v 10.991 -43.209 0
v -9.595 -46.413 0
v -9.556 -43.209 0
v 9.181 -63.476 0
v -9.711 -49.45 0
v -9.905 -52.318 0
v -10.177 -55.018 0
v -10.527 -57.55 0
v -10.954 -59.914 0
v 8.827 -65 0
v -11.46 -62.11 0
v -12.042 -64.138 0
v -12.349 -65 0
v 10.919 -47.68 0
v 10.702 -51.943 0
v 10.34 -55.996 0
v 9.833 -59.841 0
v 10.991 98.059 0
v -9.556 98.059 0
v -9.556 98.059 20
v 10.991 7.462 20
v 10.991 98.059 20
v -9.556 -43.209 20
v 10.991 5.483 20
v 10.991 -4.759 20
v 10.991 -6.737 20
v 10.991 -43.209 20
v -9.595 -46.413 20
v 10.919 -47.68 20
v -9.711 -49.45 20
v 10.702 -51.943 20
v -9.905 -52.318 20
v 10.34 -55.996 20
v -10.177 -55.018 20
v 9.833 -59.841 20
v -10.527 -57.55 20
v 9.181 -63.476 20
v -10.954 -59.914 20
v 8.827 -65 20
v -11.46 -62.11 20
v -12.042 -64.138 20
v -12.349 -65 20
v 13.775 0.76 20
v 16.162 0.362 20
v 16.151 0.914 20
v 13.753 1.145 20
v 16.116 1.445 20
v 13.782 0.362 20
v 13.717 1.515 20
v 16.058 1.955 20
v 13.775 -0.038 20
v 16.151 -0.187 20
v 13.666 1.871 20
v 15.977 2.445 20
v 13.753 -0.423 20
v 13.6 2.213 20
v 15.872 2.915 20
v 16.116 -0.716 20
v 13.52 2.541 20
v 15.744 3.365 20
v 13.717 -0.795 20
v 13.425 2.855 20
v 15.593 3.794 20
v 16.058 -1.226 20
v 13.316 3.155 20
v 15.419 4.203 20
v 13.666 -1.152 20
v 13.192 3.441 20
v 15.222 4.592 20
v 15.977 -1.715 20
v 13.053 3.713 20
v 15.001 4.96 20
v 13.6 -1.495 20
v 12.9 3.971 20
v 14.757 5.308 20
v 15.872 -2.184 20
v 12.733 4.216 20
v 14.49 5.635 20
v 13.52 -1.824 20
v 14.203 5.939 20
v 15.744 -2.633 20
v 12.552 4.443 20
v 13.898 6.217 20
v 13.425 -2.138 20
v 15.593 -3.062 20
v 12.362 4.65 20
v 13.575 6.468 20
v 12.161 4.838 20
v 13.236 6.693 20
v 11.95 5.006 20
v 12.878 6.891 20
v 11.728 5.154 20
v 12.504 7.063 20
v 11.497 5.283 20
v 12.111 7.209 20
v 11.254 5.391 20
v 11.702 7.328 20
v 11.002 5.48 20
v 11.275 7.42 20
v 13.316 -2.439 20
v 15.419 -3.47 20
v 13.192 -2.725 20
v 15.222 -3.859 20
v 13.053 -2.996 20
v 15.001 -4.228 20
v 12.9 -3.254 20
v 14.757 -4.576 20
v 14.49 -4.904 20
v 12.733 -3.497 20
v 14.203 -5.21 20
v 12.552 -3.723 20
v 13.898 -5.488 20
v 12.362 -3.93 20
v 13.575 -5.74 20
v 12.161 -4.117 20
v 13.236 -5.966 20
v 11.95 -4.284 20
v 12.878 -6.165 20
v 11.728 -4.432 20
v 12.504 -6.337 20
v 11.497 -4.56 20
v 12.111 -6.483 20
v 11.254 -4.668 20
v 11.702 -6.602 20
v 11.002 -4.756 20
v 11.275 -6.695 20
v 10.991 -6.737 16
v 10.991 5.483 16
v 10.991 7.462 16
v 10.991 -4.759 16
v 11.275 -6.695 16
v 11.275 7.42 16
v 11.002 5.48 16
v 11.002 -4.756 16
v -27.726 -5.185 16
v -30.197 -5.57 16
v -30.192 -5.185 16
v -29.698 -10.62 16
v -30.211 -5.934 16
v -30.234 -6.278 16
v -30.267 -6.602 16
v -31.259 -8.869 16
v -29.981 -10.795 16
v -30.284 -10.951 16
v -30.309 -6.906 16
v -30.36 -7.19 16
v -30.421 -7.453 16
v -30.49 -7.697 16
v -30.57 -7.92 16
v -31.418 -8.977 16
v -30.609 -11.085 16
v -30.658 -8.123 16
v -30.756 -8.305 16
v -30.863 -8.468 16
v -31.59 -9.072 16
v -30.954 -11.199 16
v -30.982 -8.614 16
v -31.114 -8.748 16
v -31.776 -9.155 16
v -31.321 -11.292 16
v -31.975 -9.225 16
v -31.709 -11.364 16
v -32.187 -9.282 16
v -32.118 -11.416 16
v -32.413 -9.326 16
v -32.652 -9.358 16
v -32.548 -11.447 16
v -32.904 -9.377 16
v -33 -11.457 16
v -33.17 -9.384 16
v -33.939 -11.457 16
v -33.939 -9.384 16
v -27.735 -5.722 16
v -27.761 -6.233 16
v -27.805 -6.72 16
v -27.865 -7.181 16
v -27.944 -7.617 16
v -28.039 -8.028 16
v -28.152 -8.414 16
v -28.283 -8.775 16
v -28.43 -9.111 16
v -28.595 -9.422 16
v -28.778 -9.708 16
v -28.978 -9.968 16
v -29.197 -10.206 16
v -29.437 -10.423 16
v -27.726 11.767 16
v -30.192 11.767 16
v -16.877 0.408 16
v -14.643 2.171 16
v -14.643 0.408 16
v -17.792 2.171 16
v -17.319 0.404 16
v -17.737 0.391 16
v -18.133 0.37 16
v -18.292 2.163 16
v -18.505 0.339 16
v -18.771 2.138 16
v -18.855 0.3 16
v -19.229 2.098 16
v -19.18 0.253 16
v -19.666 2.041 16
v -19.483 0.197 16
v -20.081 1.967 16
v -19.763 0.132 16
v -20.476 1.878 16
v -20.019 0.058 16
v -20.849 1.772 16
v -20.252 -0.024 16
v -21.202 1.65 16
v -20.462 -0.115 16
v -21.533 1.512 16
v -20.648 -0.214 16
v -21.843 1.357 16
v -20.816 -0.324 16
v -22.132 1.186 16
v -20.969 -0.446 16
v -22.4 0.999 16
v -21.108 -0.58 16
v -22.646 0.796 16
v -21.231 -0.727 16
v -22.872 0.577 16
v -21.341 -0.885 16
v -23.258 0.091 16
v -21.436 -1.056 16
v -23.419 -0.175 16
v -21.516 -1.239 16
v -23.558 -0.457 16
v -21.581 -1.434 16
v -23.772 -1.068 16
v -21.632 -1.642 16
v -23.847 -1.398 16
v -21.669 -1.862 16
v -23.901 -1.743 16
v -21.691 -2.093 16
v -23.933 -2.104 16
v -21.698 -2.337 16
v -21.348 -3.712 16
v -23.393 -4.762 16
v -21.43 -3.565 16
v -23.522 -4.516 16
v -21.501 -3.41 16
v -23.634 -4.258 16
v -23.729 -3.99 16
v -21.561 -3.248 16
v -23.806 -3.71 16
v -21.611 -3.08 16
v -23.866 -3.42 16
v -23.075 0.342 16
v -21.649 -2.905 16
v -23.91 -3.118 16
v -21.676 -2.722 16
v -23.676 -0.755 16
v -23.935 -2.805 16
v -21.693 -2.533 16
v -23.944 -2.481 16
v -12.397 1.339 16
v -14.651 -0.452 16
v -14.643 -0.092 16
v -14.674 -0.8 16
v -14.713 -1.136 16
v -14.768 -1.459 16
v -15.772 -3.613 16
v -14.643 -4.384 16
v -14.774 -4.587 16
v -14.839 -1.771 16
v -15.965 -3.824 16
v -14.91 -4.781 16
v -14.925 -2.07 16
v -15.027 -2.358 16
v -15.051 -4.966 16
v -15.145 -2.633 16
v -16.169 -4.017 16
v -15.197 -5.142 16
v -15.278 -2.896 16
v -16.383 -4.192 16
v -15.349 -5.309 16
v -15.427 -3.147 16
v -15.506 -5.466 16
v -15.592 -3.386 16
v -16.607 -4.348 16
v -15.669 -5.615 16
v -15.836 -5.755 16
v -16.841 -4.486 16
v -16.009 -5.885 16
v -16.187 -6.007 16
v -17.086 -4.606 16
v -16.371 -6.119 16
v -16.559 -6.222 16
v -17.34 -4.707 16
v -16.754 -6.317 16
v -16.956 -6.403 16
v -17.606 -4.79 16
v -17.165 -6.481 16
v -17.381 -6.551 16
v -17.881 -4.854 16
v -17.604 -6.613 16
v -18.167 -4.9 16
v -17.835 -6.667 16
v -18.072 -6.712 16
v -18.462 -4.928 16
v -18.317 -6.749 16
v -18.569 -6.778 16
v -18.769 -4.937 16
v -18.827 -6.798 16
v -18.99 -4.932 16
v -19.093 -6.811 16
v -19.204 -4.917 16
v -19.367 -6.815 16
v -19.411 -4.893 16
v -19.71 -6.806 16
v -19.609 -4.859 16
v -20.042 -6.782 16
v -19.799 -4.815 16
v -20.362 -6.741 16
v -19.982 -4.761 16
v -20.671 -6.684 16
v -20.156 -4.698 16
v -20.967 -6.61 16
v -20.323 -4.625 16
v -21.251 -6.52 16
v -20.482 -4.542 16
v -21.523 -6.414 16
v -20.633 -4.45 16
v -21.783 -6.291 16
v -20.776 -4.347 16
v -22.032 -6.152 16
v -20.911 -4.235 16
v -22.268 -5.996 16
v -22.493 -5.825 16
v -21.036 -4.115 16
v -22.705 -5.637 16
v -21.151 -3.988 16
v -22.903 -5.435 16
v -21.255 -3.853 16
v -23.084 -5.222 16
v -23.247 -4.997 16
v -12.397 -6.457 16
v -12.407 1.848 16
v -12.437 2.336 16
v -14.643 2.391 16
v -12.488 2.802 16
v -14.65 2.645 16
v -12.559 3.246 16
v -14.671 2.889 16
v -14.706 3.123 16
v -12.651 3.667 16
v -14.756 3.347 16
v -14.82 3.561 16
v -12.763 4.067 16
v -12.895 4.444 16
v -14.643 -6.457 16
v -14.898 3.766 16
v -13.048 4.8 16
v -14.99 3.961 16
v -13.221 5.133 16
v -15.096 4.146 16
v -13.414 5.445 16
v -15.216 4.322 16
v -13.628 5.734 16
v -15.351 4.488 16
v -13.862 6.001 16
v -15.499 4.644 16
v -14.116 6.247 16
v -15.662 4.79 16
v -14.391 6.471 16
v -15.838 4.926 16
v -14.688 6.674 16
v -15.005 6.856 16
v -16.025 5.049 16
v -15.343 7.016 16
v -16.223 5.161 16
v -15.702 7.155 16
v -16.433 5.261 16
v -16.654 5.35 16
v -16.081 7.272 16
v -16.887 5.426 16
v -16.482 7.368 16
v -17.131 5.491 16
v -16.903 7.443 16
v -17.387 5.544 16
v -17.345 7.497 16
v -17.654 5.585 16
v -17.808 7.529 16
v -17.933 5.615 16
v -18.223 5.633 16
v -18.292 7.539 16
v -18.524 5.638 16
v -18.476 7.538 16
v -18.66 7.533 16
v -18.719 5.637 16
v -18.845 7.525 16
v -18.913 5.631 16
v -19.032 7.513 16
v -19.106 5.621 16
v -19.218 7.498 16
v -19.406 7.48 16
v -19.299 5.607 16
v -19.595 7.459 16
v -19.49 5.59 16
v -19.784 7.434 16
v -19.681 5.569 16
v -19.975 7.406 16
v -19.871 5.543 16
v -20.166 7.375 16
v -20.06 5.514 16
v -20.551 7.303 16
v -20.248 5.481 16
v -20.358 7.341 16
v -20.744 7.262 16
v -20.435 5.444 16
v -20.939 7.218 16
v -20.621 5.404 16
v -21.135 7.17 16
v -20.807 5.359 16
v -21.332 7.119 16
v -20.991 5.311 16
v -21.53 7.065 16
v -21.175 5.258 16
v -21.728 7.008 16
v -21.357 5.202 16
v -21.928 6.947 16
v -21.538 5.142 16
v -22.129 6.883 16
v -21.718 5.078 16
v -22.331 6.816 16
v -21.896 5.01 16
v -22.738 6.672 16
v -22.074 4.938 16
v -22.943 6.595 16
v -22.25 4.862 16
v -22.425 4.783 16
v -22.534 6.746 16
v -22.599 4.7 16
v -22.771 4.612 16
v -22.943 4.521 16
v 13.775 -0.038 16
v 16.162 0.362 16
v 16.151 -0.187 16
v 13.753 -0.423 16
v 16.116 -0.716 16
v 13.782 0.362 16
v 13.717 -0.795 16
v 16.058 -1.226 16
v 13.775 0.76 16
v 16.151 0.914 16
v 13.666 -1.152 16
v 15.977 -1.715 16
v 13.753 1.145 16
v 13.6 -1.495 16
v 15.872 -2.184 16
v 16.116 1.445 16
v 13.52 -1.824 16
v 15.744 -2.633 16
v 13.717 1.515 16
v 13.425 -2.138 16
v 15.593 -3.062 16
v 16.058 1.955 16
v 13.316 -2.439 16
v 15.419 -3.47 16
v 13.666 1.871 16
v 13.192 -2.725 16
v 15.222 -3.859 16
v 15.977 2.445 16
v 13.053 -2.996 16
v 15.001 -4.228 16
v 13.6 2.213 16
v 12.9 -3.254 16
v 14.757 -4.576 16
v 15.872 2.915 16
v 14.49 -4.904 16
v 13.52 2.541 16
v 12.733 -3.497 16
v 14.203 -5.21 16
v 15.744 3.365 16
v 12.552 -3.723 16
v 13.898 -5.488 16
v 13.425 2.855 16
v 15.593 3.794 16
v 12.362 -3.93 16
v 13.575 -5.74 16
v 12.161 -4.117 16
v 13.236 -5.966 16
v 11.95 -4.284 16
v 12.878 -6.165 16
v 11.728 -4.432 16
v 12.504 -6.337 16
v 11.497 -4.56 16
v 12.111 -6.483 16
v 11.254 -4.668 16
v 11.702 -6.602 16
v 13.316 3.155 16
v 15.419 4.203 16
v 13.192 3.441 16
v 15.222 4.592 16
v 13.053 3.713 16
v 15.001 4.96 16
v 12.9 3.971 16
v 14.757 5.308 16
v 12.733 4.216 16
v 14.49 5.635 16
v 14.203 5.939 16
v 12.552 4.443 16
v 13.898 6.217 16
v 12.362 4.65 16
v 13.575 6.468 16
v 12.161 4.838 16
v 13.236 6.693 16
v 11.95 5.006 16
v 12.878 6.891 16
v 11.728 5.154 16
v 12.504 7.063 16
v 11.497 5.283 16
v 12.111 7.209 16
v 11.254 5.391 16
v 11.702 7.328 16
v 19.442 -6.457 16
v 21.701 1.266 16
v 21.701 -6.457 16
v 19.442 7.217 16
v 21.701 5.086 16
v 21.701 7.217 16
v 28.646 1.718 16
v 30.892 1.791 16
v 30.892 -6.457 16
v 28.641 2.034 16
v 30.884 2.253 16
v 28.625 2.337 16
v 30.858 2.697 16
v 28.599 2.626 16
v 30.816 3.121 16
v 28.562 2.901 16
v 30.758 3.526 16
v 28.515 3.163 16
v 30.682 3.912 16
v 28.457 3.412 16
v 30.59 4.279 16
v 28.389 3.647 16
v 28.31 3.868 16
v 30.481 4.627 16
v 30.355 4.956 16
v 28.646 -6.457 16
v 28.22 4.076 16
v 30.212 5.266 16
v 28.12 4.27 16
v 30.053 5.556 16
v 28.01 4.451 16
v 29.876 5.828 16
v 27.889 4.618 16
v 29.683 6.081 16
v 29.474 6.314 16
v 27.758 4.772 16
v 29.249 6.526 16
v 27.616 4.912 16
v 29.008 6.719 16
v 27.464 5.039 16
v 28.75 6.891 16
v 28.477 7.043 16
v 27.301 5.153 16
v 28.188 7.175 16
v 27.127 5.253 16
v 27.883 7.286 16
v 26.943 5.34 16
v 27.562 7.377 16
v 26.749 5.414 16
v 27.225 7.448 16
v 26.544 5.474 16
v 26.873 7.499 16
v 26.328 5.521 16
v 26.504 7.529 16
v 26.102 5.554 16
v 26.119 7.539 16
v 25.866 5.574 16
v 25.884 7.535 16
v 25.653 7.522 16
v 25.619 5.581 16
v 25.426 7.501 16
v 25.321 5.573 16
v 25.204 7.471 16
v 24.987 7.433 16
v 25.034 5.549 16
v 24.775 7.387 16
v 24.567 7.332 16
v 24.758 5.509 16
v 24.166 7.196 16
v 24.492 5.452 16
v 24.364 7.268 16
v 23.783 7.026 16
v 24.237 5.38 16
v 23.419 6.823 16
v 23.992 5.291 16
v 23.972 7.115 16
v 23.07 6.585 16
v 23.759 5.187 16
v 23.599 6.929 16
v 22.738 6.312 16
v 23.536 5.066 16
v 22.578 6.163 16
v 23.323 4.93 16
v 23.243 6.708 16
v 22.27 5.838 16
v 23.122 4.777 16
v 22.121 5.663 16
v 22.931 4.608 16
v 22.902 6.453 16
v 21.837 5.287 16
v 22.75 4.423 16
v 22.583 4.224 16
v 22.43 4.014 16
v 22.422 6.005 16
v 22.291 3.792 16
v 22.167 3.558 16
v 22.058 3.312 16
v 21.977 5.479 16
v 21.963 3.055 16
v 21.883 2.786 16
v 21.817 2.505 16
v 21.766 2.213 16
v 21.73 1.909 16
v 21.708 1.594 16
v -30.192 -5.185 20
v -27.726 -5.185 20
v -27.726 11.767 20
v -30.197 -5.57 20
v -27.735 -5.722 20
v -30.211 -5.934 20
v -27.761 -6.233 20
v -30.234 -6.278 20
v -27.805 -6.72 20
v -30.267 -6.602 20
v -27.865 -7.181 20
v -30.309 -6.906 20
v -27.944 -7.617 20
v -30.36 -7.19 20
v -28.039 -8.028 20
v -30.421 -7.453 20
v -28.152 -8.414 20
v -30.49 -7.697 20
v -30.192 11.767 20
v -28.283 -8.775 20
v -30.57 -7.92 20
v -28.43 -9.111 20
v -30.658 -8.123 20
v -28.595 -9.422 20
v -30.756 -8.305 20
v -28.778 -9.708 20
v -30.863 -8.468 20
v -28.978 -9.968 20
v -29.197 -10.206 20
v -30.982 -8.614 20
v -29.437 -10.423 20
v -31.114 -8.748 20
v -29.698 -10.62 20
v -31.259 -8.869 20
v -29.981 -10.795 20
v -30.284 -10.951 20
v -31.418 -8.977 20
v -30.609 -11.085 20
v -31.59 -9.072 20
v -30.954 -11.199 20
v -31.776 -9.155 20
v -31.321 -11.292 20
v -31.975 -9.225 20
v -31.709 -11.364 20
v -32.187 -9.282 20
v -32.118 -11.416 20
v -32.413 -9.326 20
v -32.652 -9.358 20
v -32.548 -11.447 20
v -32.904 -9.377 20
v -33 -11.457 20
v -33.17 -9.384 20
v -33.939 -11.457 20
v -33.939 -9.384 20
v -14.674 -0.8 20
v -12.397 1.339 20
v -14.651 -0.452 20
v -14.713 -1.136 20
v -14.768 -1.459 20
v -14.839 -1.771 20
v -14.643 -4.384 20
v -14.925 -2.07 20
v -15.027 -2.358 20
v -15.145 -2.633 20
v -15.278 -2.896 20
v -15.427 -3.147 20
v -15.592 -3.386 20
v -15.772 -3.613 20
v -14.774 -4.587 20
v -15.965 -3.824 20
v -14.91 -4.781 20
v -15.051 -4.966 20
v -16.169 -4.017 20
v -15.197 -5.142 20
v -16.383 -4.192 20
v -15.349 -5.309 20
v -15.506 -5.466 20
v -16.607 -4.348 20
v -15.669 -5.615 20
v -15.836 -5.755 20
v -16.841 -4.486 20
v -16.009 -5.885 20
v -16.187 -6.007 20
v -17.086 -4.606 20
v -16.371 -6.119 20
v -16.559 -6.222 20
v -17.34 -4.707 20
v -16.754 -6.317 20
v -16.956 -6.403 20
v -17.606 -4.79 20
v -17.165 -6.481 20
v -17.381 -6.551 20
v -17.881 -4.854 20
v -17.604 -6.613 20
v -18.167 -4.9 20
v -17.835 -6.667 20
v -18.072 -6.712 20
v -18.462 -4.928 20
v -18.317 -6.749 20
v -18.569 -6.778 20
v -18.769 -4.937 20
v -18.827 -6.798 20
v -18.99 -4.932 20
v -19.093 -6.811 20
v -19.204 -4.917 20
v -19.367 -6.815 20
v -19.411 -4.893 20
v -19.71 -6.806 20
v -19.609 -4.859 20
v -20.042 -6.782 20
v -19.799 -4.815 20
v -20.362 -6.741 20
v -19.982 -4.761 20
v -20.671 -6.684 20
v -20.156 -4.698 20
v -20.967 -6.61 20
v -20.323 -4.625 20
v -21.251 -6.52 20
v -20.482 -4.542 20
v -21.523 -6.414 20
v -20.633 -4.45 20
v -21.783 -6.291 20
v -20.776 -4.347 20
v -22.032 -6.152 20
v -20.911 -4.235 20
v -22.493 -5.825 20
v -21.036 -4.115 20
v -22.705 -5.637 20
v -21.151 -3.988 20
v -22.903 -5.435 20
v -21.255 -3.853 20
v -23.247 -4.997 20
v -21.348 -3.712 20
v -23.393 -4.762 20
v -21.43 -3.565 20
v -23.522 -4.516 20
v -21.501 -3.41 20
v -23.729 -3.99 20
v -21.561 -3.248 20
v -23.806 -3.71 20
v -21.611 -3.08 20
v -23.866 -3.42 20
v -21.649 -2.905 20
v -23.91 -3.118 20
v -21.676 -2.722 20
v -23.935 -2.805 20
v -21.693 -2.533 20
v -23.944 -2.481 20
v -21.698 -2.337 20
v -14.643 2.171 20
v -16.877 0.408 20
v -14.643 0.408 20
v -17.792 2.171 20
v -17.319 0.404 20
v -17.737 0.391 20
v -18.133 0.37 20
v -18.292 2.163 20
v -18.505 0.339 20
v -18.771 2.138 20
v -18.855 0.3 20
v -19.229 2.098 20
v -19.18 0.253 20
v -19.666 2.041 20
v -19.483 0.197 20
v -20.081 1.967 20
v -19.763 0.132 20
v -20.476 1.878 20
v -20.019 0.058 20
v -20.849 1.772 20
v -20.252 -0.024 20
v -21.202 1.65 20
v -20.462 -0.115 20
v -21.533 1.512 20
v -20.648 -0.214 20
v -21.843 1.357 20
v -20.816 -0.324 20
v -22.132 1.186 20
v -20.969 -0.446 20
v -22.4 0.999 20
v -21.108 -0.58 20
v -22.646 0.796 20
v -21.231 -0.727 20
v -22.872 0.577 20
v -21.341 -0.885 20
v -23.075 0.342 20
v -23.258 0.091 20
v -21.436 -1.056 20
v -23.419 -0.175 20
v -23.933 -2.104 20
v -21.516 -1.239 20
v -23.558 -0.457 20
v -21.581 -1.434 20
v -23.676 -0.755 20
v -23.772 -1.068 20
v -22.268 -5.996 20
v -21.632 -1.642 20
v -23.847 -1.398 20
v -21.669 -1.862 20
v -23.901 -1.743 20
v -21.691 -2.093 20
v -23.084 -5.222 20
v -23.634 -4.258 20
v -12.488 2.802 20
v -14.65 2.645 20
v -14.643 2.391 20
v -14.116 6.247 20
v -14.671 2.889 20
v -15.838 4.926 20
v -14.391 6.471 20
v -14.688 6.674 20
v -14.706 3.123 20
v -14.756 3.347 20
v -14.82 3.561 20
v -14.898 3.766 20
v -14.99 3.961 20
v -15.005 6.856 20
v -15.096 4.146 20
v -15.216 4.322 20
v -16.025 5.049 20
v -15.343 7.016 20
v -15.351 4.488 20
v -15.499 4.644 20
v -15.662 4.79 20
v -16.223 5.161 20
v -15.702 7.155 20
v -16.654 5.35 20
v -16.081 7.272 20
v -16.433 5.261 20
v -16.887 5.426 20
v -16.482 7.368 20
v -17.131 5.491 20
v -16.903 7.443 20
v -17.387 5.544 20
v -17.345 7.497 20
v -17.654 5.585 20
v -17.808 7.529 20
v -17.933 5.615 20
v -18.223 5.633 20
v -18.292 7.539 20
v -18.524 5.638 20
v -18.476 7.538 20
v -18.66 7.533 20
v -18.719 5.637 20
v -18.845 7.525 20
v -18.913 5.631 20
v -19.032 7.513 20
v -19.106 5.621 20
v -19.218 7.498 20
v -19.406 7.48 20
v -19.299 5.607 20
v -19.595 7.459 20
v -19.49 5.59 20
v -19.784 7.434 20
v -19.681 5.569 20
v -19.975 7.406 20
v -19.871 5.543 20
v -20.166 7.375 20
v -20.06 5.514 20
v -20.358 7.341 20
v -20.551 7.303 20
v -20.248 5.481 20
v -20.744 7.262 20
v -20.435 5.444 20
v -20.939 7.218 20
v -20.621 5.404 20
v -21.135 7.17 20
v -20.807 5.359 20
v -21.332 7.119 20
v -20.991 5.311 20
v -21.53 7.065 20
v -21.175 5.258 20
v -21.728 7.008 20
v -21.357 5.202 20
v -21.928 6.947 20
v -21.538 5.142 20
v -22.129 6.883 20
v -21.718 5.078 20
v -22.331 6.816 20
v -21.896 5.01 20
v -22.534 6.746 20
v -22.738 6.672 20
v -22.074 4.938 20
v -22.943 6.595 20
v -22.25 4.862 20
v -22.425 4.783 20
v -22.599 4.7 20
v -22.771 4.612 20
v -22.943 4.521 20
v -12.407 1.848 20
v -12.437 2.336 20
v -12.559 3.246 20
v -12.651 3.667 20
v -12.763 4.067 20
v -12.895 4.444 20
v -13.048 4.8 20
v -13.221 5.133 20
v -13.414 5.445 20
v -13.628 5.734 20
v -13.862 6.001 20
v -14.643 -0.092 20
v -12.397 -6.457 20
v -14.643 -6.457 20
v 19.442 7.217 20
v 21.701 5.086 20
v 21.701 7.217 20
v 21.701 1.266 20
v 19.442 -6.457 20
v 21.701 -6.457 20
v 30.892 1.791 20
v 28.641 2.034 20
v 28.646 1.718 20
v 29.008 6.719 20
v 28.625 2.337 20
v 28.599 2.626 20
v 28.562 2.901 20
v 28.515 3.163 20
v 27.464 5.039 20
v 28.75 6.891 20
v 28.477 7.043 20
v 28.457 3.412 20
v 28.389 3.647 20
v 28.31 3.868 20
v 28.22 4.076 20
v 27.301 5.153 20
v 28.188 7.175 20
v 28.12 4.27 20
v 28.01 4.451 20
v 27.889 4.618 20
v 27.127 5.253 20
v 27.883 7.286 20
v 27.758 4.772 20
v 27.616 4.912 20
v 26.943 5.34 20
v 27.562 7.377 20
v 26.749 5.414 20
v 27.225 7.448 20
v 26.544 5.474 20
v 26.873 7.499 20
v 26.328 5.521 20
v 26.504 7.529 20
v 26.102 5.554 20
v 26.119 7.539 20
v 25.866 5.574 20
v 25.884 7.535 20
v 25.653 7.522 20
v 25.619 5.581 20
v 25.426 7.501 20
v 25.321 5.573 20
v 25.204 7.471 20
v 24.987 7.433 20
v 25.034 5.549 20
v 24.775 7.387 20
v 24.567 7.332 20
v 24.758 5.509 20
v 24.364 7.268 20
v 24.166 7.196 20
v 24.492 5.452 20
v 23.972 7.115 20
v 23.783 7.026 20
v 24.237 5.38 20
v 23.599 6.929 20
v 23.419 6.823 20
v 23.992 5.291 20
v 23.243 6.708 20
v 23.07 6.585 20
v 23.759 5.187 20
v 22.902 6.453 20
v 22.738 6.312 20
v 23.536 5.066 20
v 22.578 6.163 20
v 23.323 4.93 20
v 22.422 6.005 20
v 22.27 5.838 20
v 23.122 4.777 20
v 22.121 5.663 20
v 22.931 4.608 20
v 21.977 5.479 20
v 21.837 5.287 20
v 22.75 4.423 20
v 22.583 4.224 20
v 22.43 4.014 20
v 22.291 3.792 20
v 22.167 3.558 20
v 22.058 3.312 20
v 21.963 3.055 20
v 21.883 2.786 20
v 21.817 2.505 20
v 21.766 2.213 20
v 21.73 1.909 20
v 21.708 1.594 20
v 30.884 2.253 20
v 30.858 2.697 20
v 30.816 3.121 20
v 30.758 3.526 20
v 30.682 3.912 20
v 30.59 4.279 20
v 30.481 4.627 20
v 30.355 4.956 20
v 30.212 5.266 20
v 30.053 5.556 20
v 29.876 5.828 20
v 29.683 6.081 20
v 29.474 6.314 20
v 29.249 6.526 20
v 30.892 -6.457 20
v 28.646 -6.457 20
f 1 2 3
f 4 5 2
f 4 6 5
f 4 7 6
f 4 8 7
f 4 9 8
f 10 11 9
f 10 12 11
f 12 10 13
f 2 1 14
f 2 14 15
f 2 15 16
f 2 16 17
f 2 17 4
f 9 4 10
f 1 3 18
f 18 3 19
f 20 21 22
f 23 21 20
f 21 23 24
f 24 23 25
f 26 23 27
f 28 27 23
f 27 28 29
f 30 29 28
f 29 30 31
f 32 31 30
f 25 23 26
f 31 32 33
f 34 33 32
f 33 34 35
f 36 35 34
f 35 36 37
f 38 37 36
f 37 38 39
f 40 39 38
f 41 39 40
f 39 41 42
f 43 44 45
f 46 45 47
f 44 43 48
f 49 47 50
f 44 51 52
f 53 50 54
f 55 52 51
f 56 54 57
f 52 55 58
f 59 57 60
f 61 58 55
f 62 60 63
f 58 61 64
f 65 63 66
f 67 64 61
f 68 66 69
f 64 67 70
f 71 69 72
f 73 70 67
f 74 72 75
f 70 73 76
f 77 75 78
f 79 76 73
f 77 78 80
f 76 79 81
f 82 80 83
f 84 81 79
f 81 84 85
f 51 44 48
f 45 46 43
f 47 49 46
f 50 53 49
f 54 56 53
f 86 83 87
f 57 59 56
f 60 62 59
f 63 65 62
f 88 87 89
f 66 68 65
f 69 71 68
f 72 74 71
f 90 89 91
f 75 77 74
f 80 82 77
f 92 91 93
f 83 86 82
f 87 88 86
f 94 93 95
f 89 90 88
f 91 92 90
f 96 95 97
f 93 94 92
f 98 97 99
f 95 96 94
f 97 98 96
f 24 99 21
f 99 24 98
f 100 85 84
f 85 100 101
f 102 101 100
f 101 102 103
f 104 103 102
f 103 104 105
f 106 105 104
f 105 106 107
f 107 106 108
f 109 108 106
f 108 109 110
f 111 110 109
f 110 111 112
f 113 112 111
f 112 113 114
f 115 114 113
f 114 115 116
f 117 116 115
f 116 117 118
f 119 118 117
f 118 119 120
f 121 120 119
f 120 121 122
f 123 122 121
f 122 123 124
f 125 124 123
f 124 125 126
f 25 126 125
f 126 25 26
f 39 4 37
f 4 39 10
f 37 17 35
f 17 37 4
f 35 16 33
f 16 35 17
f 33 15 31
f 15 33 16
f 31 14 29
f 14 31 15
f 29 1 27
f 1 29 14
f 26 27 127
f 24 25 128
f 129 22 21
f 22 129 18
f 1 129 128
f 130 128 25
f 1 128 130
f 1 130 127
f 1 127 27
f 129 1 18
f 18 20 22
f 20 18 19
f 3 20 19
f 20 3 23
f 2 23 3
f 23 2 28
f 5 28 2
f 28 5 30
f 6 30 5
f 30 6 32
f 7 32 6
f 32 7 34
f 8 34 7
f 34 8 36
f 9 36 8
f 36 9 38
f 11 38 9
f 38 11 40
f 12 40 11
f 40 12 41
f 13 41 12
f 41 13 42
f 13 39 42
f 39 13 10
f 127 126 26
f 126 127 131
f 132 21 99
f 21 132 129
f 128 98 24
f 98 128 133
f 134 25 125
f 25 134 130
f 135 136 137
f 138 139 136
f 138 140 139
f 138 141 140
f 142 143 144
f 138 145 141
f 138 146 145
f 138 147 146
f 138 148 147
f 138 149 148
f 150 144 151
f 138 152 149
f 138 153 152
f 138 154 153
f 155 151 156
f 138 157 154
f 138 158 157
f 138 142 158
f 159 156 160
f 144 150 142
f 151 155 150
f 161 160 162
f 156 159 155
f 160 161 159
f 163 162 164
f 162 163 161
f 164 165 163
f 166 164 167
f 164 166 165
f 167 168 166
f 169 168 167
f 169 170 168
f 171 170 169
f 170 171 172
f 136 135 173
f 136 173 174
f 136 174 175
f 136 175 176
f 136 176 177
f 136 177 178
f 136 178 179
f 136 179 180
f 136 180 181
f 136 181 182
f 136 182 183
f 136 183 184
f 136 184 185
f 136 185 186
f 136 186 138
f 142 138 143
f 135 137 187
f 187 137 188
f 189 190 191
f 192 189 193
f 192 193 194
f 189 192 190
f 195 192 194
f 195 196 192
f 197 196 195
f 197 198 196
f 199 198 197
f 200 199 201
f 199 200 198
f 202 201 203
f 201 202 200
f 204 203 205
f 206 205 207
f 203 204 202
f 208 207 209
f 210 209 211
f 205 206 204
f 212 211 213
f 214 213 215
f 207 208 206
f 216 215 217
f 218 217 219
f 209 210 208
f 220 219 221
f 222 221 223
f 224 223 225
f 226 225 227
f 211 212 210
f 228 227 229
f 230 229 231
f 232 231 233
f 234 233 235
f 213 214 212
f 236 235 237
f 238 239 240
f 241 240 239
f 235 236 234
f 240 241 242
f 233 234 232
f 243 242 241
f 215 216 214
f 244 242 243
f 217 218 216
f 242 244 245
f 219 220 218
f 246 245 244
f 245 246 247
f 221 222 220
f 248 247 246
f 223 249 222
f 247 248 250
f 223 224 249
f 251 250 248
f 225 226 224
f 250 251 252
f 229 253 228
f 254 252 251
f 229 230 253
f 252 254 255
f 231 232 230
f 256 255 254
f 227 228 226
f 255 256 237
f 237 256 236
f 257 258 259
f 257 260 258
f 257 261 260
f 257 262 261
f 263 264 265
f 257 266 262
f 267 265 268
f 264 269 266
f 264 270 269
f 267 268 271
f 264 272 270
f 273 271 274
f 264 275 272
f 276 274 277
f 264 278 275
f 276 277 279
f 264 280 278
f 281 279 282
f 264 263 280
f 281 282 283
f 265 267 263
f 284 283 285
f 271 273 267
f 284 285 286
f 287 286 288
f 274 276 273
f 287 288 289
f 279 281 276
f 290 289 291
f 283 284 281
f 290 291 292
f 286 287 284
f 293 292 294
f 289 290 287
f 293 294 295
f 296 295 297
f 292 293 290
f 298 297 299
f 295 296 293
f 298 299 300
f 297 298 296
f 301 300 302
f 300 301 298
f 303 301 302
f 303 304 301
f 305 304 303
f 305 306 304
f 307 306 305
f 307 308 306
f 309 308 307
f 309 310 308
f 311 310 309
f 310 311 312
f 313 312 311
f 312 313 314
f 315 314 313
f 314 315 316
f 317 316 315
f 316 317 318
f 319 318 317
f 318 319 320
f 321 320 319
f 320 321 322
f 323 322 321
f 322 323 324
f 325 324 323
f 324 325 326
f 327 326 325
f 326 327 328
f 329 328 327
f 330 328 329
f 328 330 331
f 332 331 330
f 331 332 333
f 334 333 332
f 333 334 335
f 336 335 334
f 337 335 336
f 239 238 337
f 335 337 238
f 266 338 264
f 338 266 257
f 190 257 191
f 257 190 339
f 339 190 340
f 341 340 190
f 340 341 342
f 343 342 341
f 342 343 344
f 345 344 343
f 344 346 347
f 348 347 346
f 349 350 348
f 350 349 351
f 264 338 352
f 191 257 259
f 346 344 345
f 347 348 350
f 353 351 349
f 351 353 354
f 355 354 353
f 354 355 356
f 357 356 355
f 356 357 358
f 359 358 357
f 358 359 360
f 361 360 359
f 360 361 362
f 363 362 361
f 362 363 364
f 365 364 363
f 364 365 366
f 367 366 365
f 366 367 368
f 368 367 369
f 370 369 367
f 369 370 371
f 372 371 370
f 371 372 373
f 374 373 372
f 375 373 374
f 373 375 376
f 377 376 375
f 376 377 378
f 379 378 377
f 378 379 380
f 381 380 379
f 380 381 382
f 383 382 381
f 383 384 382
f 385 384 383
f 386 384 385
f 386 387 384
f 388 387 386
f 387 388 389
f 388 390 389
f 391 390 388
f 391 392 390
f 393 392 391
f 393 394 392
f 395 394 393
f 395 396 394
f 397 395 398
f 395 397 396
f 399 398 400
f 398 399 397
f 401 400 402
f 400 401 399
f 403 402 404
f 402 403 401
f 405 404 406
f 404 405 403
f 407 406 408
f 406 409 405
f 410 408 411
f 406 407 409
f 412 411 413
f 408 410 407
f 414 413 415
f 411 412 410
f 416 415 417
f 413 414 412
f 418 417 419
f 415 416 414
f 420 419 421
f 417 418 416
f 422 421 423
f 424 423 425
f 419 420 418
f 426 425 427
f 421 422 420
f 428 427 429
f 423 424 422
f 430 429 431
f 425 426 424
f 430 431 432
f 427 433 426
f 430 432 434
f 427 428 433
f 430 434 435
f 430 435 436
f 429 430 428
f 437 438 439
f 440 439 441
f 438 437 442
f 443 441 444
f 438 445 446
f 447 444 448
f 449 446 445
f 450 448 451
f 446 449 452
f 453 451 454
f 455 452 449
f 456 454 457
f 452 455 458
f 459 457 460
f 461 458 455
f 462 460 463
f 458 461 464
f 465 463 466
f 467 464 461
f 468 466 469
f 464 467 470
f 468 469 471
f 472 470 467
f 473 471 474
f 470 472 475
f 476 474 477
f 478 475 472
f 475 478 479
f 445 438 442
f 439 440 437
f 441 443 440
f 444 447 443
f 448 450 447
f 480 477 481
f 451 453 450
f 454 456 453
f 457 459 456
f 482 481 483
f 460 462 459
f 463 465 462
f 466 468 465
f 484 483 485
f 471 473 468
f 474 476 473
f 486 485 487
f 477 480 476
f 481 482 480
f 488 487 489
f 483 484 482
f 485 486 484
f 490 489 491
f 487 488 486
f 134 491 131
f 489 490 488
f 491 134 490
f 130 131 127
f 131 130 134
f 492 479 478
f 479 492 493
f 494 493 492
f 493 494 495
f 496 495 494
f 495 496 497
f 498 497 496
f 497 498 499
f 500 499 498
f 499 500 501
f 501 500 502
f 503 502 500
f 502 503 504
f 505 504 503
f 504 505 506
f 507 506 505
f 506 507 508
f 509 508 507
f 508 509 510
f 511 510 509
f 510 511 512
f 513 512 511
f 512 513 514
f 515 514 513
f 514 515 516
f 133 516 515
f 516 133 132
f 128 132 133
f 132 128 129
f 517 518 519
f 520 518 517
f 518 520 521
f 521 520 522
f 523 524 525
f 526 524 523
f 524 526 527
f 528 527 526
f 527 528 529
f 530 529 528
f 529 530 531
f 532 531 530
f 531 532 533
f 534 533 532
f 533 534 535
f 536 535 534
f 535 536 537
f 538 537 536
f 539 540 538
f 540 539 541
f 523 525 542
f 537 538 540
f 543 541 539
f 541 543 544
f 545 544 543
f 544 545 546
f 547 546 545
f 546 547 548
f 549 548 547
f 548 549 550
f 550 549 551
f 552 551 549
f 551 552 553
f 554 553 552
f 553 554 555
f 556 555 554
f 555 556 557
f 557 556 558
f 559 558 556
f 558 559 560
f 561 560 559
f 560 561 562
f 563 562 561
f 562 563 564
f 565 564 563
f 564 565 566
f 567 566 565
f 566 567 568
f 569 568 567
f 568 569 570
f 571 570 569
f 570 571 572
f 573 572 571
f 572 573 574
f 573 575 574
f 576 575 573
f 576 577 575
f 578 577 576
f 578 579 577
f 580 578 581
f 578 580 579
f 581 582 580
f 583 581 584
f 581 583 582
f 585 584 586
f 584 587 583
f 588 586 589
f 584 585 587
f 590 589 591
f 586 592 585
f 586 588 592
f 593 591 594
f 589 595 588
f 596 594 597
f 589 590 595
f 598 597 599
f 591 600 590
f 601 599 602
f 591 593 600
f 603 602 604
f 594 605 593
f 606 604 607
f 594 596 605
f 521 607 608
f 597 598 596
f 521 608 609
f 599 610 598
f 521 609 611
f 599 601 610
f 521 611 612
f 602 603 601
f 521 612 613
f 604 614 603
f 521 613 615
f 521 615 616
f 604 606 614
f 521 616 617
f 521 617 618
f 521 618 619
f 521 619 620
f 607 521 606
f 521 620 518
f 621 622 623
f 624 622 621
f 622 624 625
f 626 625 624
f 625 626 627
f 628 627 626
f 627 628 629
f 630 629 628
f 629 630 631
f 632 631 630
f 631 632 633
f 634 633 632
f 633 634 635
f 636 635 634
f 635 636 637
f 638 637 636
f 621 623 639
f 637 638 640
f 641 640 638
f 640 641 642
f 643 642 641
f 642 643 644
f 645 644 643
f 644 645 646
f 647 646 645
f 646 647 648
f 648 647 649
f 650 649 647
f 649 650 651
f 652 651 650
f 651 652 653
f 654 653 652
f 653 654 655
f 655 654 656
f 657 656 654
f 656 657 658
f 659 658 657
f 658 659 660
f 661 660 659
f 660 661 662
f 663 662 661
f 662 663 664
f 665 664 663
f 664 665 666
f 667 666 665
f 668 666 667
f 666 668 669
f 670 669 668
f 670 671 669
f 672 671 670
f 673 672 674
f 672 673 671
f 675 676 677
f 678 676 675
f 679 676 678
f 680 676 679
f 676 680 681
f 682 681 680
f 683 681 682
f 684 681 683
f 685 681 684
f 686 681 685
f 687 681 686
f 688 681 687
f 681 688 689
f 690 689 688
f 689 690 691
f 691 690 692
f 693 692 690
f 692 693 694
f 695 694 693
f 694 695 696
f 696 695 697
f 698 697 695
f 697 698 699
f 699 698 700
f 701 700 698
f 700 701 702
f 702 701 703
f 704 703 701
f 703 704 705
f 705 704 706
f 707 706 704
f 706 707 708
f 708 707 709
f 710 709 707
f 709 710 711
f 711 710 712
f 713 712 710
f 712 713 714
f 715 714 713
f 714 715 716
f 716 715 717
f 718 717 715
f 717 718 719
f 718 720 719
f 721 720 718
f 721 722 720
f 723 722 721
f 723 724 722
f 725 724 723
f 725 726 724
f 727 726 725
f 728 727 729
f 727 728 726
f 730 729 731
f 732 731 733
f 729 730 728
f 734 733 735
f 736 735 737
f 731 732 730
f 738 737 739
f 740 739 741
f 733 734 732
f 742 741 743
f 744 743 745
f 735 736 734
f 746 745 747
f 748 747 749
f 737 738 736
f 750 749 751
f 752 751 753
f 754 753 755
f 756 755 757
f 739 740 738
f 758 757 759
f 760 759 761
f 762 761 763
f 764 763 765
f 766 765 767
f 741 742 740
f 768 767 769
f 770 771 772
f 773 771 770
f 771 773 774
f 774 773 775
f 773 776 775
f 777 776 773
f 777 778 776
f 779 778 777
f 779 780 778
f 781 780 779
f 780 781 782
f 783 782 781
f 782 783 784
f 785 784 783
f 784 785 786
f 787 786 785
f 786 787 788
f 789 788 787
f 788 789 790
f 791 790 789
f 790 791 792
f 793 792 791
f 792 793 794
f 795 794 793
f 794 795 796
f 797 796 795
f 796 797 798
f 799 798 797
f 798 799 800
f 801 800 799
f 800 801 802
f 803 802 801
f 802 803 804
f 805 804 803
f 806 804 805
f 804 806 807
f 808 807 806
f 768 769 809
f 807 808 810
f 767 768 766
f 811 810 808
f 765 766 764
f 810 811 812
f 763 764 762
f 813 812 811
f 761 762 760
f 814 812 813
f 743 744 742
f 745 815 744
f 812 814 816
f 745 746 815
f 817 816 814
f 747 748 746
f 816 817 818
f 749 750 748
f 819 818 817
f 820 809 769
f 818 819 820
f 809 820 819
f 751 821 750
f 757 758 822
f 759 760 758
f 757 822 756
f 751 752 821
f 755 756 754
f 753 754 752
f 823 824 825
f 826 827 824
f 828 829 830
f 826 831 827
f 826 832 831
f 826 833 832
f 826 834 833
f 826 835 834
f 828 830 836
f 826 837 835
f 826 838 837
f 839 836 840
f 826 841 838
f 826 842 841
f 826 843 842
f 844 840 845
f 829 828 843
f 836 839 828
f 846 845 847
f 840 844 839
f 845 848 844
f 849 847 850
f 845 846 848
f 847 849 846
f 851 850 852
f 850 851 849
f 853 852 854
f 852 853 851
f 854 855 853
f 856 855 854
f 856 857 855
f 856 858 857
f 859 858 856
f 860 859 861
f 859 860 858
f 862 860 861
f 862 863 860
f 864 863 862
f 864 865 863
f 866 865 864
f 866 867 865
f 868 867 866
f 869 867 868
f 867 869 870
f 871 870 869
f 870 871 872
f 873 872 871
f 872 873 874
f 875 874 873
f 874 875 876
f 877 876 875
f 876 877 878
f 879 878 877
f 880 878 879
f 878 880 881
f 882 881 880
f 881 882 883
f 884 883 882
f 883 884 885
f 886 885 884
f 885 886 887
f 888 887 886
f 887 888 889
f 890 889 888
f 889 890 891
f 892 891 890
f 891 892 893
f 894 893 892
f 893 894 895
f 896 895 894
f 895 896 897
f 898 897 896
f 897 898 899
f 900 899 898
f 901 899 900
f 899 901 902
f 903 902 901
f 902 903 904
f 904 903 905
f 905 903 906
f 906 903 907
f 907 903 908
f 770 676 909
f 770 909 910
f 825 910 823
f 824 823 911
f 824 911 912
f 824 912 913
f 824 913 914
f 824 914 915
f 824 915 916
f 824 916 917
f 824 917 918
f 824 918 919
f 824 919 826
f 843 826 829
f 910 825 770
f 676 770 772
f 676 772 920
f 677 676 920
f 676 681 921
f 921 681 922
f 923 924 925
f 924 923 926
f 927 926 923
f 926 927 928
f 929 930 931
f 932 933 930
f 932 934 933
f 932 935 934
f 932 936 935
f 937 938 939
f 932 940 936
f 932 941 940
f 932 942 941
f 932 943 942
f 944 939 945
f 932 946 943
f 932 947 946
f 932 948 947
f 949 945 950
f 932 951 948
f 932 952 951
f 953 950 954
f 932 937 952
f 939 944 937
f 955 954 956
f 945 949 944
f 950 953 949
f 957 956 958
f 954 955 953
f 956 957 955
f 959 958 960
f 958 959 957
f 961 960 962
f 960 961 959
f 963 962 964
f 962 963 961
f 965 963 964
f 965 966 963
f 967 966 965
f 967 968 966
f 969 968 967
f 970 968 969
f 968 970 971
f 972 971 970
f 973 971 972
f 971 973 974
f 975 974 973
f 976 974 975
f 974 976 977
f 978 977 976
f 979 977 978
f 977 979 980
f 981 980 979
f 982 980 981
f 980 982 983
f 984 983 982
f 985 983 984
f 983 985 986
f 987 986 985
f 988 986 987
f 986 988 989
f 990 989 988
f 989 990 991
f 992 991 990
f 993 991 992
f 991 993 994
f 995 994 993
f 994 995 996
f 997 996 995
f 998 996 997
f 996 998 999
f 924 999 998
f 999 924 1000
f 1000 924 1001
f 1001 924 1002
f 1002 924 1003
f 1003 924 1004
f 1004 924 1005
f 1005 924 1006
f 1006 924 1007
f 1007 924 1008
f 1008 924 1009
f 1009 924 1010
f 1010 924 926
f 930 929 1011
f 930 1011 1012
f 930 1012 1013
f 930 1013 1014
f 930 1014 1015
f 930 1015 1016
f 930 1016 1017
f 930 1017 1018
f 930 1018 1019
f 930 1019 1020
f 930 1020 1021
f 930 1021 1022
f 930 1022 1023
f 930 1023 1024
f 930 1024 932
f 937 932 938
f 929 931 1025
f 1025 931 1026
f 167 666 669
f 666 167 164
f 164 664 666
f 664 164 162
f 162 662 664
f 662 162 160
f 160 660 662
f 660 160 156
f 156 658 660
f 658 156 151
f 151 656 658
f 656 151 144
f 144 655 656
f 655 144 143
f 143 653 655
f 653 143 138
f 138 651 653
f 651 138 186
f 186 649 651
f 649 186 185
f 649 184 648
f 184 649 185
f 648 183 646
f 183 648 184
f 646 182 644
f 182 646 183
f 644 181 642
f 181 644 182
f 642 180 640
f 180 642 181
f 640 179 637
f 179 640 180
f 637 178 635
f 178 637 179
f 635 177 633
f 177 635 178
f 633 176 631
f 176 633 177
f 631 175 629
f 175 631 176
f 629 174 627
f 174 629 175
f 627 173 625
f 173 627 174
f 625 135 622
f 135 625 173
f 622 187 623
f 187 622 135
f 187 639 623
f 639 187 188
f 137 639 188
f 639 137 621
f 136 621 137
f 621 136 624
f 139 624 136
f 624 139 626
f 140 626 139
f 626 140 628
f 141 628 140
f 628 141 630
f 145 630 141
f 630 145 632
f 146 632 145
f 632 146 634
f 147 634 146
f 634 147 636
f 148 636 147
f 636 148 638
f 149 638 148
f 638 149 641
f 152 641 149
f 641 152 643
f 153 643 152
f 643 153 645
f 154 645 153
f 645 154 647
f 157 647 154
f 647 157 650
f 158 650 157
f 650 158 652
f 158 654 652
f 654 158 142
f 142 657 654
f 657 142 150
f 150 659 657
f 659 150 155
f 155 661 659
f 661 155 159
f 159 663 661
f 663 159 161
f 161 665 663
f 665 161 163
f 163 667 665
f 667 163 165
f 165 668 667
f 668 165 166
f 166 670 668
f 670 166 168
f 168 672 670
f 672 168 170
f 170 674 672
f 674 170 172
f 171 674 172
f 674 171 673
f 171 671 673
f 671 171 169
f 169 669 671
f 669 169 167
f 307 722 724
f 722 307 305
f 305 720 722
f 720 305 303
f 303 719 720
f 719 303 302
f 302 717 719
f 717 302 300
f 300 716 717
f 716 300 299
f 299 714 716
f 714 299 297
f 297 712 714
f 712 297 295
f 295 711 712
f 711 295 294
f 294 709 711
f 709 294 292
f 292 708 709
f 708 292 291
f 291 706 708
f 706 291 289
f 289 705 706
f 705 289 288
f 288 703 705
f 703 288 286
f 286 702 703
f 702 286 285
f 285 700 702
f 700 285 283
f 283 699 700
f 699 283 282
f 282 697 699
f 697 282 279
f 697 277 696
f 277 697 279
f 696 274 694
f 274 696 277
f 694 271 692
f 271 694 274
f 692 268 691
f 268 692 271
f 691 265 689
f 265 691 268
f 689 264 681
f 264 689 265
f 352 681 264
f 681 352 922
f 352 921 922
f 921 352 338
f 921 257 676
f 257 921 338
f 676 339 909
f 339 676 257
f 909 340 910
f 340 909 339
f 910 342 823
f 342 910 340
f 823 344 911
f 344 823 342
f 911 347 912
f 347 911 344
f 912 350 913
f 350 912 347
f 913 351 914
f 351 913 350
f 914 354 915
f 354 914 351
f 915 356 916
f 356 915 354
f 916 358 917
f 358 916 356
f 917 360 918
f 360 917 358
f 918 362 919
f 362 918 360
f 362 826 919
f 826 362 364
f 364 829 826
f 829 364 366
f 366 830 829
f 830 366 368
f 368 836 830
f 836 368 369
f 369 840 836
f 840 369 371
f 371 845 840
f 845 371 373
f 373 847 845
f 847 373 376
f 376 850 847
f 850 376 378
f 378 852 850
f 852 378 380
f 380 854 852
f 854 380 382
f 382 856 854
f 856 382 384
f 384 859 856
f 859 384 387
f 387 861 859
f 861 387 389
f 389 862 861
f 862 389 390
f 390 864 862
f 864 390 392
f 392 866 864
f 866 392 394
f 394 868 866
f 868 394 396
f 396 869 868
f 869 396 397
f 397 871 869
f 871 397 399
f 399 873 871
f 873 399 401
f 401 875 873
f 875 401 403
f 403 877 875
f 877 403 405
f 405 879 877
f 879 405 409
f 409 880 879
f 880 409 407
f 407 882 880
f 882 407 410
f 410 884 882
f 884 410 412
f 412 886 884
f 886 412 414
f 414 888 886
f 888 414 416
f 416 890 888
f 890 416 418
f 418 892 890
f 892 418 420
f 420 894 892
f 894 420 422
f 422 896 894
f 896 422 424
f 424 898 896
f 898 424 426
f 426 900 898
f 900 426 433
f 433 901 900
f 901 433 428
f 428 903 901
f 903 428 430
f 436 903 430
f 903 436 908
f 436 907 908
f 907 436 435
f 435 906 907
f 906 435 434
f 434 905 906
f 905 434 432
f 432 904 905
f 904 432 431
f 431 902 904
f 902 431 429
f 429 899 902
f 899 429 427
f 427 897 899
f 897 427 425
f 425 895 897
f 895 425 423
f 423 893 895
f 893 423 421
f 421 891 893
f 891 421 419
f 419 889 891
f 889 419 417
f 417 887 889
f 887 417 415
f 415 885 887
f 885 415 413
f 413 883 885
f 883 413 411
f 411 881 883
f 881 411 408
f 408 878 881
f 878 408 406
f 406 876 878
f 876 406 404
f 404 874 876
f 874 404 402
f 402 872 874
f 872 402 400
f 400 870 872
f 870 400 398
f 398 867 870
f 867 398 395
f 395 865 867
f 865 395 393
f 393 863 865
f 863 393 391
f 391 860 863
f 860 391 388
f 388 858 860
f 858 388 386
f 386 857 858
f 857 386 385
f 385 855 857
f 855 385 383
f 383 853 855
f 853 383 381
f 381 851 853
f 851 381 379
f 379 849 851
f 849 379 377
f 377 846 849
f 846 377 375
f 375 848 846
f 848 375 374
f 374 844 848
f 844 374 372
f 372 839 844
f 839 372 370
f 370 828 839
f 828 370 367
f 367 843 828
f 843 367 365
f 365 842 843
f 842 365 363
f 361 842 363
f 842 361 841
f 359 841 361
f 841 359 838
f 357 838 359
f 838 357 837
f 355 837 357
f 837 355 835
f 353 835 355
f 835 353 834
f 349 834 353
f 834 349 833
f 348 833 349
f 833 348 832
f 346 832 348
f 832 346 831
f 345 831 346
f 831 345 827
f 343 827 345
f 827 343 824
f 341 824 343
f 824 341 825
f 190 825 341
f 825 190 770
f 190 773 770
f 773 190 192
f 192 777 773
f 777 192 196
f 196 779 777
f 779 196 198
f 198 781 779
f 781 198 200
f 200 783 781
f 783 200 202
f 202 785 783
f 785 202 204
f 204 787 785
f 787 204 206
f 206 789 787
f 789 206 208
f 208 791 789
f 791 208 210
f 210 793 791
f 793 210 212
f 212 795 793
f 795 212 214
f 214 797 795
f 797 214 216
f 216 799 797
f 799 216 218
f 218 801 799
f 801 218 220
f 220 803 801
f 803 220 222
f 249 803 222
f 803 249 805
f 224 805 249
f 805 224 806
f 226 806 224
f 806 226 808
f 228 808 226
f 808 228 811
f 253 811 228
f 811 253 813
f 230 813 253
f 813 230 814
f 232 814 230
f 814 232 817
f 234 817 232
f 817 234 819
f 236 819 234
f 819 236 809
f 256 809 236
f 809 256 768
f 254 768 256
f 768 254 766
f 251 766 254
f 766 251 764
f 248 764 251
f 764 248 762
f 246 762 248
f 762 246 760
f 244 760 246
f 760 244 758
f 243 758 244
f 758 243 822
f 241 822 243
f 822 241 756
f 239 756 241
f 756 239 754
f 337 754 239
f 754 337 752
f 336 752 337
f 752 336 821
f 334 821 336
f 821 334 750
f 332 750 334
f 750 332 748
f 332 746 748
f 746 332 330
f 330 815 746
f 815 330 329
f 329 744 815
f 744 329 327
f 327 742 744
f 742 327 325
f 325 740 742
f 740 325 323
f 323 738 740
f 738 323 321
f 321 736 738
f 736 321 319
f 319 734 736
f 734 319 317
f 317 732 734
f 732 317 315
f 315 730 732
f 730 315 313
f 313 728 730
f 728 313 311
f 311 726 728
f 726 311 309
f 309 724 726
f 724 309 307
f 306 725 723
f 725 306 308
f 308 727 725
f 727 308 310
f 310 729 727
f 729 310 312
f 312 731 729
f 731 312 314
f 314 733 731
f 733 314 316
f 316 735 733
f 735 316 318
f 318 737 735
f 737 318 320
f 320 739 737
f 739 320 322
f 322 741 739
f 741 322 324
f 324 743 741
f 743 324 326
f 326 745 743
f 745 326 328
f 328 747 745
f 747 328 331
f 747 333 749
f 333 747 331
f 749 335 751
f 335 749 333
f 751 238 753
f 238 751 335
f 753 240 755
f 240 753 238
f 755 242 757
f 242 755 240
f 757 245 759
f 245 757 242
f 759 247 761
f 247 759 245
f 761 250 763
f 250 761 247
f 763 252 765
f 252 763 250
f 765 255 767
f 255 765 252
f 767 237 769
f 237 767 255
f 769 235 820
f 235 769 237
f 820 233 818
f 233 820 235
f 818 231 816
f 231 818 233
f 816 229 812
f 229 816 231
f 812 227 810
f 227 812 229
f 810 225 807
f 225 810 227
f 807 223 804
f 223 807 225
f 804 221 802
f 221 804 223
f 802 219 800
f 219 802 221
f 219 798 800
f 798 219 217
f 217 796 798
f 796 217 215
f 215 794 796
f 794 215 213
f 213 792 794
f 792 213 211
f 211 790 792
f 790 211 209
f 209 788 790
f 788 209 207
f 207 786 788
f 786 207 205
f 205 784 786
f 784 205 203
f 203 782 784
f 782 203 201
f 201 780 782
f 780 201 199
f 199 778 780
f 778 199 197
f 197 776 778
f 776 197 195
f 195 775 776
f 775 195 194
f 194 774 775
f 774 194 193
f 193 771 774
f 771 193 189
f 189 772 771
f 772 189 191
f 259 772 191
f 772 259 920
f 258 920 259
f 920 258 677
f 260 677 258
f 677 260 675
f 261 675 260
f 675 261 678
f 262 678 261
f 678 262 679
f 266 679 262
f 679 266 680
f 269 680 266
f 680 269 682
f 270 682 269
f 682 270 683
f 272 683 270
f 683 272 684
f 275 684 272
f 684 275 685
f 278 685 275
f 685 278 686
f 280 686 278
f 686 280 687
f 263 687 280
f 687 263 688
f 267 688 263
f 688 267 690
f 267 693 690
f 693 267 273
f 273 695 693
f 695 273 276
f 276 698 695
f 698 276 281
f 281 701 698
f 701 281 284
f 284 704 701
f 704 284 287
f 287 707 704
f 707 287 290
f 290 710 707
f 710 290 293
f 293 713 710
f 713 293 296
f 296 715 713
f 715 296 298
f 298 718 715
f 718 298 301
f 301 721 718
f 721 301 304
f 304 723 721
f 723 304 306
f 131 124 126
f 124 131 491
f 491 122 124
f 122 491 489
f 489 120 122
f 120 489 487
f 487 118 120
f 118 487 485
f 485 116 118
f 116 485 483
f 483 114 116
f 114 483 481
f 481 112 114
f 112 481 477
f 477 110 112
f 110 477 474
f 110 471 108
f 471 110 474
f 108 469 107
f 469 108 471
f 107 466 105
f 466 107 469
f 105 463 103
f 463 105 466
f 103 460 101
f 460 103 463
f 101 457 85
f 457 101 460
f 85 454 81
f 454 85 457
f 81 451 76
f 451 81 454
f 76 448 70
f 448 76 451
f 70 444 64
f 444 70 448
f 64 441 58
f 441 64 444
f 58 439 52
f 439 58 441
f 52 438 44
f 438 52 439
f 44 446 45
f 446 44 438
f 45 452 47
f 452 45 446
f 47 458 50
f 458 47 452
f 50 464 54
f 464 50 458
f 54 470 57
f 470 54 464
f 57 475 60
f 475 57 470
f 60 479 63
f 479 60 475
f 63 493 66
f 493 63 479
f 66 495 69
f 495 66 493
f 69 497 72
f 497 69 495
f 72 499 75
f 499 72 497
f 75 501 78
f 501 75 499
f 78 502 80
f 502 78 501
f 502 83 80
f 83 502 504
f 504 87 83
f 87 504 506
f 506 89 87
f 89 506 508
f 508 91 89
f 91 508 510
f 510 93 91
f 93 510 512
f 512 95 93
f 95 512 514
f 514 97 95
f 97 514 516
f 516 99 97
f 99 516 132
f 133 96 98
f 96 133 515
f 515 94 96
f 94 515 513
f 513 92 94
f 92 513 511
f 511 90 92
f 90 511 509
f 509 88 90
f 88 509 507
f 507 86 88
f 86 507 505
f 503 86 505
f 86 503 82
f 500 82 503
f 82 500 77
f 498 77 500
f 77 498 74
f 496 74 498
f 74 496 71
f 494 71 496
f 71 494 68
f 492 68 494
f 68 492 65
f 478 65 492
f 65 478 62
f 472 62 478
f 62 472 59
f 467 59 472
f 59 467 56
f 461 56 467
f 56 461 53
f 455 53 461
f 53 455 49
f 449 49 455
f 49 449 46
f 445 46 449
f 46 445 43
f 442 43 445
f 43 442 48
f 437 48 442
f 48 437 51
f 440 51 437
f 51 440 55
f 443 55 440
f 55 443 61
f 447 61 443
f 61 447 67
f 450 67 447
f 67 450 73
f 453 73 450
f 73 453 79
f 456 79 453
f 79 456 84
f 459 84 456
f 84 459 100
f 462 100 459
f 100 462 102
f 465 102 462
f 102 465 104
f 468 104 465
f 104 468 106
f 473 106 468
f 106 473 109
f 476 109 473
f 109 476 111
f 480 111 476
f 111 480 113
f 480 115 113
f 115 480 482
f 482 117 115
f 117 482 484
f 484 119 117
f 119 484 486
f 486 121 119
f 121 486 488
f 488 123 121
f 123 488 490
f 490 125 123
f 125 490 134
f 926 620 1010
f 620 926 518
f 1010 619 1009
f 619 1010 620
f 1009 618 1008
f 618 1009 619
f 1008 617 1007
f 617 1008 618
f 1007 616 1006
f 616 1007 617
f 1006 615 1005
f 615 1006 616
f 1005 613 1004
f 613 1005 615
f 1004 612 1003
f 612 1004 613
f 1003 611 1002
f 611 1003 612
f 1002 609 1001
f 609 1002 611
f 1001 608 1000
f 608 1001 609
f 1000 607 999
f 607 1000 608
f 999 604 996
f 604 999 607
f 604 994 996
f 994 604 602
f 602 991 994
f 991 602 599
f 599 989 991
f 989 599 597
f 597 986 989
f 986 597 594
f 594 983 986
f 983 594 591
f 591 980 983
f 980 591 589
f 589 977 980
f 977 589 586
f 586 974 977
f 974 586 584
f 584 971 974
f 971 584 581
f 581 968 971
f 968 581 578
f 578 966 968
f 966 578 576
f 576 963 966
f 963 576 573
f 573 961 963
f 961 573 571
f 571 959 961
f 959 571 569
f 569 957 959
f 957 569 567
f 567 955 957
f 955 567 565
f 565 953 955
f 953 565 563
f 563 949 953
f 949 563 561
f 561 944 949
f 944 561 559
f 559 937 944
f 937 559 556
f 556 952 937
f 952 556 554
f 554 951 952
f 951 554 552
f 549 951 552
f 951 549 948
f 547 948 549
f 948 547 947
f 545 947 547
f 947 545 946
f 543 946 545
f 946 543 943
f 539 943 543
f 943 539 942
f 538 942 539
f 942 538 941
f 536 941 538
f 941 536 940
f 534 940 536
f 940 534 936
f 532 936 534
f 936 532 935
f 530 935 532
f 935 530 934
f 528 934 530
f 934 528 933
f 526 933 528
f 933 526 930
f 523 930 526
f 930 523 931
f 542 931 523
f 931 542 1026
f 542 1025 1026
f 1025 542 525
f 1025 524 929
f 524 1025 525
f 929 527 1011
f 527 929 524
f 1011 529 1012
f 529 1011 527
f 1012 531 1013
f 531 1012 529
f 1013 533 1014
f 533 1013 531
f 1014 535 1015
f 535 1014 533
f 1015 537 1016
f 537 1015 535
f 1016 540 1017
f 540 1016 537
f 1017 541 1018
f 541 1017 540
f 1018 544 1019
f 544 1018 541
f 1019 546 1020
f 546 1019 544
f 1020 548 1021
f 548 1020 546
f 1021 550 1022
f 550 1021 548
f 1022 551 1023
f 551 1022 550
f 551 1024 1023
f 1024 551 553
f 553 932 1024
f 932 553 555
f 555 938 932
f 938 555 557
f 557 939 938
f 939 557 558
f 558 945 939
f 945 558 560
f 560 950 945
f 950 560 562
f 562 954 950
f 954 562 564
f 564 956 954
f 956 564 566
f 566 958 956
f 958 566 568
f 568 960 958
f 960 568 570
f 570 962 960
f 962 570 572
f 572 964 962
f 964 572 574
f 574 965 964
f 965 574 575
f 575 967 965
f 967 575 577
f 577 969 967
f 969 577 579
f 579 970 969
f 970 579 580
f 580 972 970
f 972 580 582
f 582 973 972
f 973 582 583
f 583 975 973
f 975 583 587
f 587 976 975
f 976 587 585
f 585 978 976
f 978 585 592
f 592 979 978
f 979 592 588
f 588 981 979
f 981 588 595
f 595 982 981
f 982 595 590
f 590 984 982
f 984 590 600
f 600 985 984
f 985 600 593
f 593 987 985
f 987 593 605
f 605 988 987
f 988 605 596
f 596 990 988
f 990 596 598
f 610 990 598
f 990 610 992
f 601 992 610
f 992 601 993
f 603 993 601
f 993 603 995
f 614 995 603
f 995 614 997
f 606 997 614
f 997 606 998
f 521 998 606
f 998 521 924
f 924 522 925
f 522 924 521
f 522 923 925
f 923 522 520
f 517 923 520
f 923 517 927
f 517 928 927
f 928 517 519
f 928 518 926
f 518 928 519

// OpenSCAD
// ============================================================================
// nome_parametrico.scad — NameForge
// ============================================================================

// ── Texte ────────────────────────────────────────────────────────────────────
nome                 = "Jason";
font_base            = "Bebas Neue:style=Regular";
font_corsivo         = "Pacifico:style=Regular";
mostra_base          = 1;
mostra_nome          = 1;

// ── Dimensions (mm) ──────────────────────────────────────────────────────────
altezza_base         = 20;
profondita_incisione = 4;   // 0 = nom affleurant, N = N mm de profondeur
dimensione_lettera   = 150;
dimensione_nome      = 18;
altezza_nome_solido  = 7;   // hauteur totale du bloc nom (incrusté + dépassement)
offset_nome_x        = 0;
offset_nome_y        = 0;
tolleranza           = 0.1;
margine_taglio       = 10;

// nome_preview_z : Z de départ du nom
// preview  : altezza_base - profondita_incisione → nom dans le creux
// export   : 0 → chemin base_avec_nom_export
nome_preview_z       = 0;

// incidi_preview : 1 = générer base avec creux visible
incidi_preview       = 0;

// taglio_base : mm à retirer depuis le bas du bounding box de la lettre
// 0 = pas de coupe (courbe conservée), 30 = coupe haute (lettre très plate)
taglio_base          = 10;

// ── Couleurs ─────────────────────────────────────────────────────────────────
colore_base          = [0.914, 0.580, 0.965];
colore_nome          = [1.000, 1.000, 1.000];

// chanfrein_haut_mm : bord supérieur chanfreiné (biseauté à 45°)
// 0 = désactivé ; ex. 1.5 = chanfrein de 1.5 mm
chanfrein_haut_mm    = 0;

// ── Qualité ──────────────────────────────────────────────────────────────────
$fa = 4;
$fs = 0.4;

// ── Assertions de sécurité ───────────────────────────────────────────────────
assert(len(nome) > 0,
  "Le texte ne peut pas être vide");
assert(profondita_incisione < altezza_base,
  "profondita_incisione doit être < altezza_base");
assert(chanfrein_haut_mm == 0 || chanfrein_haut_mm < altezza_base,
  "chanfrein_haut_mm doit être < altezza_base");
assert(chanfrein_haut_mm == 0 || chanfrein_haut_mm < dimensione_lettera / 2,
  "chanfrein_haut_mm trop grand par rapport à la taille de la lettre");
assert(taglio_base >= 0 && taglio_base < dimensione_lettera * 0.5,
  "taglio_base doit être dans [0, dimensione_lettera/2[");

// ============================================================================
// Modules
// ============================================================================

// Lettre avec bas plat : intersection 3D pour couper la courbe du bas
// taglio_base = 0 → pas de coupe ; taglio_base = 30 → coupe 30 mm depuis le bas
// chanfrein_haut_mm > 0 → biseau 45° sur le bord supérieur
module forme_base() {
    module lettera_2d() {
        text(nome[0],
             size   = dimensione_lettera,
             font   = font_base,
             halign = "center",
             valign = "center");
    }

    module corps() {
        if (chanfrein_haut_mm > 0 && chanfrein_haut_mm < altezza_base) {
            // Parois droites jusqu'à (altezza_base - c), puis biseau sur c mm
            let (c         = chanfrein_haut_mm,
                 scale_top = max(0.01, 1 - 2 * chanfrein_haut_mm / dimensione_lettera)) {
                union() {
                    linear_extrude(height = altezza_base - c, convexity = 10)
                        lettera_2d();
                    translate([0, 0, altezza_base - c])
                        linear_extrude(height = c, convexity = 10, scale = scale_top)
                            lettera_2d();
                }
            }
        } else {
            linear_extrude(height = altezza_base, convexity = 10)
                lettera_2d();
        }
    }

    intersection() {
        corps();
        translate([-dimensione_lettera,
                   -dimensione_lettera * 0.5 + taglio_base,
                   -1])
            cube([dimensione_lettera * 2, dimensione_lettera * 1.5, altezza_base + 2]);
    }
}

module shape_nom() {
    text(nome,
         size   = dimensione_nome,
         font   = font_corsivo,
         halign = "center",
         valign = "center");
}

// Base seule
module base_seule() {
    color(colore_base)
    forme_base();
}

// Base avec creux incrusté visible (pour preview et affichage sans nom)
module base_incisa() {
    color(colore_base)
    difference() {
        forme_base();
        translate([offset_nome_x, offset_nome_y,
                   altezza_base - profondita_incisione + tolleranza])
            linear_extrude(height = profondita_incisione + tolleranza,
                           convexity = 10)
                shape_nom();
    }
}

// Nom seul — Z départ = nome_preview_z, hauteur = altezza_nome_solido
// altezza_nome_solido - profondita_incisione = mm qui dépassent au-dessus du J
module nom_seul() {
    color(colore_nome)
    translate([offset_nome_x, offset_nome_y, nome_preview_z])
        linear_extrude(height = altezza_nome_solido, convexity = 10)
            shape_nom();
}

// Export impression multicolor : creux + bloc nom flush
module base_avec_nom_export() {
    color(colore_base)
    difference() {
        forme_base();
        translate([offset_nome_x, offset_nome_y,
                   altezza_base - profondita_incisione + tolleranza])
            linear_extrude(height = profondita_incisione + tolleranza,
                           convexity = 10)
                shape_nom();
    }
    color(colore_nome)
    translate([offset_nome_x, offset_nome_y,
               altezza_base - profondita_incisione])
        linear_extrude(height = profondita_incisione, convexity = 10)
            shape_nom();
}

// ============================================================================
// Assemblage
// ============================================================================

if (mostra_base && mostra_nome) {
    if (nome_preview_z > 0) {
        if (incidi_preview) base_incisa(); else base_seule();
        nom_seul();
    } else {
        base_avec_nom_export();
    }
}
else if (mostra_base) {
    // Export mode (nome_preview_z==0) : toujours creuser — sinon le creux disparaît
    if (nome_preview_z == 0 || incidi_preview) base_incisa(); else base_seule();
}
else if (mostra_nome) {
    if (nome_preview_z == 0) {
        // Export standalone : hauteur = profondita_incisione pour s'emboîter exactement dans le creux
        color(colore_nome)
        translate([offset_nome_x, offset_nome_y, 0])
            linear_extrude(height = profondita_incisione, convexity = 10)
                shape_nom();
    } else {
        nom_seul();
    }
}
else {
    echo("AVERTISSEMENT: mostra_base=0 ET mostra_nome=0 — rien à générer.");
}
